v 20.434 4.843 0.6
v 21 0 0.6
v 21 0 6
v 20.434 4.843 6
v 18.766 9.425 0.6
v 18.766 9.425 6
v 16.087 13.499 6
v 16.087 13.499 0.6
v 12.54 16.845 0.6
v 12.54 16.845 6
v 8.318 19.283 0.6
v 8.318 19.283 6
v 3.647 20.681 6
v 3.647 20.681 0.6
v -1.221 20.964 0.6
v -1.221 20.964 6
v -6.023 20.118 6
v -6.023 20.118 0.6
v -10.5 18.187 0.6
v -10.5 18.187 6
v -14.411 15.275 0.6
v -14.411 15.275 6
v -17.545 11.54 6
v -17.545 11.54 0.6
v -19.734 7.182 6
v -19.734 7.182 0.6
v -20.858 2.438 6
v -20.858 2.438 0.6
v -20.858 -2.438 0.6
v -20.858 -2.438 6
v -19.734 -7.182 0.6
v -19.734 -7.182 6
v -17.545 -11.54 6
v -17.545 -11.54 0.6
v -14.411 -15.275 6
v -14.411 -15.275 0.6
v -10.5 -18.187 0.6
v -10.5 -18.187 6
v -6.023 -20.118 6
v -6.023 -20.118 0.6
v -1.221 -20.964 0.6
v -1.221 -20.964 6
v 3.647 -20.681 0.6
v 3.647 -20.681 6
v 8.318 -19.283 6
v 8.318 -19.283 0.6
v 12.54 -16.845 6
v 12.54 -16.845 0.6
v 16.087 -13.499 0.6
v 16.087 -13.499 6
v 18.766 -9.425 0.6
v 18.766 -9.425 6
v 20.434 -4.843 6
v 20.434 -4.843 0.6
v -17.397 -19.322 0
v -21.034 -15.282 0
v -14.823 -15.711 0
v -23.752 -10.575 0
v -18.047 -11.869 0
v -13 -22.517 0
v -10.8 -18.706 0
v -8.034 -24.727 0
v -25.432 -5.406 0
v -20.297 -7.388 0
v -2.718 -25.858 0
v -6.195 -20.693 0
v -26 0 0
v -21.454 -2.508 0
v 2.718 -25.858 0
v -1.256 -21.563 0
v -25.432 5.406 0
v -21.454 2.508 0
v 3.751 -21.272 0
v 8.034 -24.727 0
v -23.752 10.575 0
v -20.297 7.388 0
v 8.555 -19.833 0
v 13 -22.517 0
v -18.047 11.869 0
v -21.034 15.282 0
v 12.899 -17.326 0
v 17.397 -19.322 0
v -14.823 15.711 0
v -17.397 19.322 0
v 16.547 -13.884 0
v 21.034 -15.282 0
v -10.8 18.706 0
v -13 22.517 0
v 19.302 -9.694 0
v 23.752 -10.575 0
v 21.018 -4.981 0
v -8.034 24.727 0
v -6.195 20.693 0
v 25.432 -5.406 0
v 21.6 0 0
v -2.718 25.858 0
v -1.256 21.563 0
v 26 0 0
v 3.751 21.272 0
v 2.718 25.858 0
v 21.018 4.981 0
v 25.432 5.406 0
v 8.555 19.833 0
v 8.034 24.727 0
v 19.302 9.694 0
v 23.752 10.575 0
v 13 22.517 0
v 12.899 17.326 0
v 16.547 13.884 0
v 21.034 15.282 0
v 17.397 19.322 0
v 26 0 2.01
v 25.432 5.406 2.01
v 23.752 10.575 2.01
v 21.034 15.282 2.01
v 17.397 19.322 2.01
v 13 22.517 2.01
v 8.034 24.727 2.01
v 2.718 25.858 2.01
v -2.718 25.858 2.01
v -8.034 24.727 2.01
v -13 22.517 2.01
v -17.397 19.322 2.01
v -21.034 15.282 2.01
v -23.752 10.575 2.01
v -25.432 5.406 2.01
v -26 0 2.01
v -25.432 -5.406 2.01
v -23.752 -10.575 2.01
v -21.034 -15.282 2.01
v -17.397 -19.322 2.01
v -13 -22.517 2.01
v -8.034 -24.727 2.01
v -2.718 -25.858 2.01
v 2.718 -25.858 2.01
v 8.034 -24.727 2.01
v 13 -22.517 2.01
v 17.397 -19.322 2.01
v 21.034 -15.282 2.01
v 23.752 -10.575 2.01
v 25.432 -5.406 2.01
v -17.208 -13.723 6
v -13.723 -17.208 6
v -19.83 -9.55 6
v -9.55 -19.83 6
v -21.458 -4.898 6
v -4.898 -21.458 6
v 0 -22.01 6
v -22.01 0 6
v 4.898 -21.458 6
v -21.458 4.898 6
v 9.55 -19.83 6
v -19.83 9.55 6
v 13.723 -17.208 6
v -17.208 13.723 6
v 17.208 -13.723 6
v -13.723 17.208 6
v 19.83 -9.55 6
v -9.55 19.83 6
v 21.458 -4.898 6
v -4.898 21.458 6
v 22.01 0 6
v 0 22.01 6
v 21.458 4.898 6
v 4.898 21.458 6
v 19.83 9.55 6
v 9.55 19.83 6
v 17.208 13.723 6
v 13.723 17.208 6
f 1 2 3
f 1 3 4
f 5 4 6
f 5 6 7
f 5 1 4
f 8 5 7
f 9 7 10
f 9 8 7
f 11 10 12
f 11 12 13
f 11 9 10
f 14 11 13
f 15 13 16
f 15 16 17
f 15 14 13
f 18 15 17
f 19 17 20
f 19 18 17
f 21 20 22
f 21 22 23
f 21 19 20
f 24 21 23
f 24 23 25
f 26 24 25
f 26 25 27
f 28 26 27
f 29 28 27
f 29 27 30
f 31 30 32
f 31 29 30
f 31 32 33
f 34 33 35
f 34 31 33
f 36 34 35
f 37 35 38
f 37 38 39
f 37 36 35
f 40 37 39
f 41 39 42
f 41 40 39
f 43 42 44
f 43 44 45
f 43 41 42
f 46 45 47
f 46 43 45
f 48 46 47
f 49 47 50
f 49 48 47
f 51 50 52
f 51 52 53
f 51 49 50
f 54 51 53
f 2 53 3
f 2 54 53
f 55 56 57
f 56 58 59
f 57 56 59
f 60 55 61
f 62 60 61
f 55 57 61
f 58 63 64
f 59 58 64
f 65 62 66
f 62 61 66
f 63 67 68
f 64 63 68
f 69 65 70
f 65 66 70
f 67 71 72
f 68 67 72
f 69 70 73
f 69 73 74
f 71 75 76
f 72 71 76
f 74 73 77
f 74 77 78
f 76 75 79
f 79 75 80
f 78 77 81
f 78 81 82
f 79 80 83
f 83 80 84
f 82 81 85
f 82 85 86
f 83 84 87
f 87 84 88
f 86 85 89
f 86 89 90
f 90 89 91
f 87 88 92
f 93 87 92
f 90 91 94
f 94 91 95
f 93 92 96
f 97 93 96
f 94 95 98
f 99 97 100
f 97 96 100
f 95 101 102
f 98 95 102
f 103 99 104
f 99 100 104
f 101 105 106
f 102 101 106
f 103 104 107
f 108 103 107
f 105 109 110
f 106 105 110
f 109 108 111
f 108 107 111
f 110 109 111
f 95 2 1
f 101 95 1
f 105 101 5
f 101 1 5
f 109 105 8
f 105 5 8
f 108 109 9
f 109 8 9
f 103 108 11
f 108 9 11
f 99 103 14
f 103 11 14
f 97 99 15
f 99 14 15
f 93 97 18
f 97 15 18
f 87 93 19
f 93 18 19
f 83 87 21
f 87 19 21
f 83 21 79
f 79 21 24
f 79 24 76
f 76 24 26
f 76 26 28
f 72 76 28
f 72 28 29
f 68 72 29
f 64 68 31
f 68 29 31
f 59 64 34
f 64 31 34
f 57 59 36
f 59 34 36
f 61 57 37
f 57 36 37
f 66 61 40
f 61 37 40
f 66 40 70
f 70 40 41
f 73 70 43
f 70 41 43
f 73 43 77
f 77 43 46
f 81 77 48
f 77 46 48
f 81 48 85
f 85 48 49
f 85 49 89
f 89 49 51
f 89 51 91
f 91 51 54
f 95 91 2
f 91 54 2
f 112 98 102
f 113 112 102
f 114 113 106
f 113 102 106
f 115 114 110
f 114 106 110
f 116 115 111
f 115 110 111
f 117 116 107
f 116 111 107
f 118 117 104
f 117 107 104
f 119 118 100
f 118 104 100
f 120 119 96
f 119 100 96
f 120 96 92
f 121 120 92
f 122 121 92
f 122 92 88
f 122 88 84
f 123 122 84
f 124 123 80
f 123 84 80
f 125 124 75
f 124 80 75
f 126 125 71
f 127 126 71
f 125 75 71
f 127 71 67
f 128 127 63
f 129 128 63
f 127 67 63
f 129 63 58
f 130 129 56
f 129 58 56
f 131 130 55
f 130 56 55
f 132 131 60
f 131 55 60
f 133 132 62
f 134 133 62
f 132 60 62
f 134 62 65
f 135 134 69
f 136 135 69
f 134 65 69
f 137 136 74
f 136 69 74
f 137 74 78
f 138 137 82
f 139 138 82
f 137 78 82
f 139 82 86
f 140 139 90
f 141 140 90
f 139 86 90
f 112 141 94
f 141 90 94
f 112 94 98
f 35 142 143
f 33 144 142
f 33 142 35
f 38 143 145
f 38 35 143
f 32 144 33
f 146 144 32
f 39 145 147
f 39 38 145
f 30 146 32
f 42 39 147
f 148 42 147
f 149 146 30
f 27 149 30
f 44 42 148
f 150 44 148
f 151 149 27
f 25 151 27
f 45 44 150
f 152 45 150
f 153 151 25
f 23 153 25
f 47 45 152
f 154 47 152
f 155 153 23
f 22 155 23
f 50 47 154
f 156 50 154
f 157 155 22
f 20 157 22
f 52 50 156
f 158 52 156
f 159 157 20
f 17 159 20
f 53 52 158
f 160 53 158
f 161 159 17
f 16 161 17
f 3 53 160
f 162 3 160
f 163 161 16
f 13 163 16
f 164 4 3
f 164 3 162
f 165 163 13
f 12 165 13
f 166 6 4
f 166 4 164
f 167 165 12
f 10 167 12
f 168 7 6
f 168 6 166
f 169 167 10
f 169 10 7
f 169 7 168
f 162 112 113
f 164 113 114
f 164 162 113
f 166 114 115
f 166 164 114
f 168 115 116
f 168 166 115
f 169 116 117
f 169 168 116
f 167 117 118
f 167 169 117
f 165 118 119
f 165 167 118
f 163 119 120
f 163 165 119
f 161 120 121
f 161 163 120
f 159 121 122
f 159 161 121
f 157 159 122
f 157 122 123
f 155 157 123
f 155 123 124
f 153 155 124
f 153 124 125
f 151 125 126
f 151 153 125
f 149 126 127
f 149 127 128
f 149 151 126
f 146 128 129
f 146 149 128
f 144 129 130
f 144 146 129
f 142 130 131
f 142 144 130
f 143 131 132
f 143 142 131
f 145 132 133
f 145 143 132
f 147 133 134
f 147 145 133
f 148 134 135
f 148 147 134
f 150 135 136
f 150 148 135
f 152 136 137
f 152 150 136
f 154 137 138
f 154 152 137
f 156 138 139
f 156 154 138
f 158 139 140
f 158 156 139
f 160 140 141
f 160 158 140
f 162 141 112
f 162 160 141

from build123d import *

# Parameters (mm, degrees)
SKETCH052_R     = 26
SKETCH052_R_2   = 21
PAD034_DEPTH    = 6
CHAMFER016_SIZE = 3.99
CHAMFER017_SIZE = 0.6


with BuildPart() as part:
    # Sketch052 (on XY_Plane016 of Origin031) → Pad034 (new body)
    with BuildSketch(Plane.XY):
        Circle(SKETCH052_R)
        Circle(SKETCH052_R_2, mode=Mode.SUBTRACT)
    extrude(amount=PAD034_DEPTH)

    # Chamfer016
    chamfer016_edges = [part.edges().sort_by_distance(p)[0] for p in [
        (-26, 0, 6),
    ]]
    chamfer(chamfer016_edges, length=CHAMFER016_SIZE)

    # Chamfer017
    chamfer017_edges = [part.edges().sort_by_distance(p)[0] for p in [
        (-21, 0, 0),
    ]]
    chamfer(chamfer017_edges, length=CHAMFER017_SIZE)


solid = part.part
